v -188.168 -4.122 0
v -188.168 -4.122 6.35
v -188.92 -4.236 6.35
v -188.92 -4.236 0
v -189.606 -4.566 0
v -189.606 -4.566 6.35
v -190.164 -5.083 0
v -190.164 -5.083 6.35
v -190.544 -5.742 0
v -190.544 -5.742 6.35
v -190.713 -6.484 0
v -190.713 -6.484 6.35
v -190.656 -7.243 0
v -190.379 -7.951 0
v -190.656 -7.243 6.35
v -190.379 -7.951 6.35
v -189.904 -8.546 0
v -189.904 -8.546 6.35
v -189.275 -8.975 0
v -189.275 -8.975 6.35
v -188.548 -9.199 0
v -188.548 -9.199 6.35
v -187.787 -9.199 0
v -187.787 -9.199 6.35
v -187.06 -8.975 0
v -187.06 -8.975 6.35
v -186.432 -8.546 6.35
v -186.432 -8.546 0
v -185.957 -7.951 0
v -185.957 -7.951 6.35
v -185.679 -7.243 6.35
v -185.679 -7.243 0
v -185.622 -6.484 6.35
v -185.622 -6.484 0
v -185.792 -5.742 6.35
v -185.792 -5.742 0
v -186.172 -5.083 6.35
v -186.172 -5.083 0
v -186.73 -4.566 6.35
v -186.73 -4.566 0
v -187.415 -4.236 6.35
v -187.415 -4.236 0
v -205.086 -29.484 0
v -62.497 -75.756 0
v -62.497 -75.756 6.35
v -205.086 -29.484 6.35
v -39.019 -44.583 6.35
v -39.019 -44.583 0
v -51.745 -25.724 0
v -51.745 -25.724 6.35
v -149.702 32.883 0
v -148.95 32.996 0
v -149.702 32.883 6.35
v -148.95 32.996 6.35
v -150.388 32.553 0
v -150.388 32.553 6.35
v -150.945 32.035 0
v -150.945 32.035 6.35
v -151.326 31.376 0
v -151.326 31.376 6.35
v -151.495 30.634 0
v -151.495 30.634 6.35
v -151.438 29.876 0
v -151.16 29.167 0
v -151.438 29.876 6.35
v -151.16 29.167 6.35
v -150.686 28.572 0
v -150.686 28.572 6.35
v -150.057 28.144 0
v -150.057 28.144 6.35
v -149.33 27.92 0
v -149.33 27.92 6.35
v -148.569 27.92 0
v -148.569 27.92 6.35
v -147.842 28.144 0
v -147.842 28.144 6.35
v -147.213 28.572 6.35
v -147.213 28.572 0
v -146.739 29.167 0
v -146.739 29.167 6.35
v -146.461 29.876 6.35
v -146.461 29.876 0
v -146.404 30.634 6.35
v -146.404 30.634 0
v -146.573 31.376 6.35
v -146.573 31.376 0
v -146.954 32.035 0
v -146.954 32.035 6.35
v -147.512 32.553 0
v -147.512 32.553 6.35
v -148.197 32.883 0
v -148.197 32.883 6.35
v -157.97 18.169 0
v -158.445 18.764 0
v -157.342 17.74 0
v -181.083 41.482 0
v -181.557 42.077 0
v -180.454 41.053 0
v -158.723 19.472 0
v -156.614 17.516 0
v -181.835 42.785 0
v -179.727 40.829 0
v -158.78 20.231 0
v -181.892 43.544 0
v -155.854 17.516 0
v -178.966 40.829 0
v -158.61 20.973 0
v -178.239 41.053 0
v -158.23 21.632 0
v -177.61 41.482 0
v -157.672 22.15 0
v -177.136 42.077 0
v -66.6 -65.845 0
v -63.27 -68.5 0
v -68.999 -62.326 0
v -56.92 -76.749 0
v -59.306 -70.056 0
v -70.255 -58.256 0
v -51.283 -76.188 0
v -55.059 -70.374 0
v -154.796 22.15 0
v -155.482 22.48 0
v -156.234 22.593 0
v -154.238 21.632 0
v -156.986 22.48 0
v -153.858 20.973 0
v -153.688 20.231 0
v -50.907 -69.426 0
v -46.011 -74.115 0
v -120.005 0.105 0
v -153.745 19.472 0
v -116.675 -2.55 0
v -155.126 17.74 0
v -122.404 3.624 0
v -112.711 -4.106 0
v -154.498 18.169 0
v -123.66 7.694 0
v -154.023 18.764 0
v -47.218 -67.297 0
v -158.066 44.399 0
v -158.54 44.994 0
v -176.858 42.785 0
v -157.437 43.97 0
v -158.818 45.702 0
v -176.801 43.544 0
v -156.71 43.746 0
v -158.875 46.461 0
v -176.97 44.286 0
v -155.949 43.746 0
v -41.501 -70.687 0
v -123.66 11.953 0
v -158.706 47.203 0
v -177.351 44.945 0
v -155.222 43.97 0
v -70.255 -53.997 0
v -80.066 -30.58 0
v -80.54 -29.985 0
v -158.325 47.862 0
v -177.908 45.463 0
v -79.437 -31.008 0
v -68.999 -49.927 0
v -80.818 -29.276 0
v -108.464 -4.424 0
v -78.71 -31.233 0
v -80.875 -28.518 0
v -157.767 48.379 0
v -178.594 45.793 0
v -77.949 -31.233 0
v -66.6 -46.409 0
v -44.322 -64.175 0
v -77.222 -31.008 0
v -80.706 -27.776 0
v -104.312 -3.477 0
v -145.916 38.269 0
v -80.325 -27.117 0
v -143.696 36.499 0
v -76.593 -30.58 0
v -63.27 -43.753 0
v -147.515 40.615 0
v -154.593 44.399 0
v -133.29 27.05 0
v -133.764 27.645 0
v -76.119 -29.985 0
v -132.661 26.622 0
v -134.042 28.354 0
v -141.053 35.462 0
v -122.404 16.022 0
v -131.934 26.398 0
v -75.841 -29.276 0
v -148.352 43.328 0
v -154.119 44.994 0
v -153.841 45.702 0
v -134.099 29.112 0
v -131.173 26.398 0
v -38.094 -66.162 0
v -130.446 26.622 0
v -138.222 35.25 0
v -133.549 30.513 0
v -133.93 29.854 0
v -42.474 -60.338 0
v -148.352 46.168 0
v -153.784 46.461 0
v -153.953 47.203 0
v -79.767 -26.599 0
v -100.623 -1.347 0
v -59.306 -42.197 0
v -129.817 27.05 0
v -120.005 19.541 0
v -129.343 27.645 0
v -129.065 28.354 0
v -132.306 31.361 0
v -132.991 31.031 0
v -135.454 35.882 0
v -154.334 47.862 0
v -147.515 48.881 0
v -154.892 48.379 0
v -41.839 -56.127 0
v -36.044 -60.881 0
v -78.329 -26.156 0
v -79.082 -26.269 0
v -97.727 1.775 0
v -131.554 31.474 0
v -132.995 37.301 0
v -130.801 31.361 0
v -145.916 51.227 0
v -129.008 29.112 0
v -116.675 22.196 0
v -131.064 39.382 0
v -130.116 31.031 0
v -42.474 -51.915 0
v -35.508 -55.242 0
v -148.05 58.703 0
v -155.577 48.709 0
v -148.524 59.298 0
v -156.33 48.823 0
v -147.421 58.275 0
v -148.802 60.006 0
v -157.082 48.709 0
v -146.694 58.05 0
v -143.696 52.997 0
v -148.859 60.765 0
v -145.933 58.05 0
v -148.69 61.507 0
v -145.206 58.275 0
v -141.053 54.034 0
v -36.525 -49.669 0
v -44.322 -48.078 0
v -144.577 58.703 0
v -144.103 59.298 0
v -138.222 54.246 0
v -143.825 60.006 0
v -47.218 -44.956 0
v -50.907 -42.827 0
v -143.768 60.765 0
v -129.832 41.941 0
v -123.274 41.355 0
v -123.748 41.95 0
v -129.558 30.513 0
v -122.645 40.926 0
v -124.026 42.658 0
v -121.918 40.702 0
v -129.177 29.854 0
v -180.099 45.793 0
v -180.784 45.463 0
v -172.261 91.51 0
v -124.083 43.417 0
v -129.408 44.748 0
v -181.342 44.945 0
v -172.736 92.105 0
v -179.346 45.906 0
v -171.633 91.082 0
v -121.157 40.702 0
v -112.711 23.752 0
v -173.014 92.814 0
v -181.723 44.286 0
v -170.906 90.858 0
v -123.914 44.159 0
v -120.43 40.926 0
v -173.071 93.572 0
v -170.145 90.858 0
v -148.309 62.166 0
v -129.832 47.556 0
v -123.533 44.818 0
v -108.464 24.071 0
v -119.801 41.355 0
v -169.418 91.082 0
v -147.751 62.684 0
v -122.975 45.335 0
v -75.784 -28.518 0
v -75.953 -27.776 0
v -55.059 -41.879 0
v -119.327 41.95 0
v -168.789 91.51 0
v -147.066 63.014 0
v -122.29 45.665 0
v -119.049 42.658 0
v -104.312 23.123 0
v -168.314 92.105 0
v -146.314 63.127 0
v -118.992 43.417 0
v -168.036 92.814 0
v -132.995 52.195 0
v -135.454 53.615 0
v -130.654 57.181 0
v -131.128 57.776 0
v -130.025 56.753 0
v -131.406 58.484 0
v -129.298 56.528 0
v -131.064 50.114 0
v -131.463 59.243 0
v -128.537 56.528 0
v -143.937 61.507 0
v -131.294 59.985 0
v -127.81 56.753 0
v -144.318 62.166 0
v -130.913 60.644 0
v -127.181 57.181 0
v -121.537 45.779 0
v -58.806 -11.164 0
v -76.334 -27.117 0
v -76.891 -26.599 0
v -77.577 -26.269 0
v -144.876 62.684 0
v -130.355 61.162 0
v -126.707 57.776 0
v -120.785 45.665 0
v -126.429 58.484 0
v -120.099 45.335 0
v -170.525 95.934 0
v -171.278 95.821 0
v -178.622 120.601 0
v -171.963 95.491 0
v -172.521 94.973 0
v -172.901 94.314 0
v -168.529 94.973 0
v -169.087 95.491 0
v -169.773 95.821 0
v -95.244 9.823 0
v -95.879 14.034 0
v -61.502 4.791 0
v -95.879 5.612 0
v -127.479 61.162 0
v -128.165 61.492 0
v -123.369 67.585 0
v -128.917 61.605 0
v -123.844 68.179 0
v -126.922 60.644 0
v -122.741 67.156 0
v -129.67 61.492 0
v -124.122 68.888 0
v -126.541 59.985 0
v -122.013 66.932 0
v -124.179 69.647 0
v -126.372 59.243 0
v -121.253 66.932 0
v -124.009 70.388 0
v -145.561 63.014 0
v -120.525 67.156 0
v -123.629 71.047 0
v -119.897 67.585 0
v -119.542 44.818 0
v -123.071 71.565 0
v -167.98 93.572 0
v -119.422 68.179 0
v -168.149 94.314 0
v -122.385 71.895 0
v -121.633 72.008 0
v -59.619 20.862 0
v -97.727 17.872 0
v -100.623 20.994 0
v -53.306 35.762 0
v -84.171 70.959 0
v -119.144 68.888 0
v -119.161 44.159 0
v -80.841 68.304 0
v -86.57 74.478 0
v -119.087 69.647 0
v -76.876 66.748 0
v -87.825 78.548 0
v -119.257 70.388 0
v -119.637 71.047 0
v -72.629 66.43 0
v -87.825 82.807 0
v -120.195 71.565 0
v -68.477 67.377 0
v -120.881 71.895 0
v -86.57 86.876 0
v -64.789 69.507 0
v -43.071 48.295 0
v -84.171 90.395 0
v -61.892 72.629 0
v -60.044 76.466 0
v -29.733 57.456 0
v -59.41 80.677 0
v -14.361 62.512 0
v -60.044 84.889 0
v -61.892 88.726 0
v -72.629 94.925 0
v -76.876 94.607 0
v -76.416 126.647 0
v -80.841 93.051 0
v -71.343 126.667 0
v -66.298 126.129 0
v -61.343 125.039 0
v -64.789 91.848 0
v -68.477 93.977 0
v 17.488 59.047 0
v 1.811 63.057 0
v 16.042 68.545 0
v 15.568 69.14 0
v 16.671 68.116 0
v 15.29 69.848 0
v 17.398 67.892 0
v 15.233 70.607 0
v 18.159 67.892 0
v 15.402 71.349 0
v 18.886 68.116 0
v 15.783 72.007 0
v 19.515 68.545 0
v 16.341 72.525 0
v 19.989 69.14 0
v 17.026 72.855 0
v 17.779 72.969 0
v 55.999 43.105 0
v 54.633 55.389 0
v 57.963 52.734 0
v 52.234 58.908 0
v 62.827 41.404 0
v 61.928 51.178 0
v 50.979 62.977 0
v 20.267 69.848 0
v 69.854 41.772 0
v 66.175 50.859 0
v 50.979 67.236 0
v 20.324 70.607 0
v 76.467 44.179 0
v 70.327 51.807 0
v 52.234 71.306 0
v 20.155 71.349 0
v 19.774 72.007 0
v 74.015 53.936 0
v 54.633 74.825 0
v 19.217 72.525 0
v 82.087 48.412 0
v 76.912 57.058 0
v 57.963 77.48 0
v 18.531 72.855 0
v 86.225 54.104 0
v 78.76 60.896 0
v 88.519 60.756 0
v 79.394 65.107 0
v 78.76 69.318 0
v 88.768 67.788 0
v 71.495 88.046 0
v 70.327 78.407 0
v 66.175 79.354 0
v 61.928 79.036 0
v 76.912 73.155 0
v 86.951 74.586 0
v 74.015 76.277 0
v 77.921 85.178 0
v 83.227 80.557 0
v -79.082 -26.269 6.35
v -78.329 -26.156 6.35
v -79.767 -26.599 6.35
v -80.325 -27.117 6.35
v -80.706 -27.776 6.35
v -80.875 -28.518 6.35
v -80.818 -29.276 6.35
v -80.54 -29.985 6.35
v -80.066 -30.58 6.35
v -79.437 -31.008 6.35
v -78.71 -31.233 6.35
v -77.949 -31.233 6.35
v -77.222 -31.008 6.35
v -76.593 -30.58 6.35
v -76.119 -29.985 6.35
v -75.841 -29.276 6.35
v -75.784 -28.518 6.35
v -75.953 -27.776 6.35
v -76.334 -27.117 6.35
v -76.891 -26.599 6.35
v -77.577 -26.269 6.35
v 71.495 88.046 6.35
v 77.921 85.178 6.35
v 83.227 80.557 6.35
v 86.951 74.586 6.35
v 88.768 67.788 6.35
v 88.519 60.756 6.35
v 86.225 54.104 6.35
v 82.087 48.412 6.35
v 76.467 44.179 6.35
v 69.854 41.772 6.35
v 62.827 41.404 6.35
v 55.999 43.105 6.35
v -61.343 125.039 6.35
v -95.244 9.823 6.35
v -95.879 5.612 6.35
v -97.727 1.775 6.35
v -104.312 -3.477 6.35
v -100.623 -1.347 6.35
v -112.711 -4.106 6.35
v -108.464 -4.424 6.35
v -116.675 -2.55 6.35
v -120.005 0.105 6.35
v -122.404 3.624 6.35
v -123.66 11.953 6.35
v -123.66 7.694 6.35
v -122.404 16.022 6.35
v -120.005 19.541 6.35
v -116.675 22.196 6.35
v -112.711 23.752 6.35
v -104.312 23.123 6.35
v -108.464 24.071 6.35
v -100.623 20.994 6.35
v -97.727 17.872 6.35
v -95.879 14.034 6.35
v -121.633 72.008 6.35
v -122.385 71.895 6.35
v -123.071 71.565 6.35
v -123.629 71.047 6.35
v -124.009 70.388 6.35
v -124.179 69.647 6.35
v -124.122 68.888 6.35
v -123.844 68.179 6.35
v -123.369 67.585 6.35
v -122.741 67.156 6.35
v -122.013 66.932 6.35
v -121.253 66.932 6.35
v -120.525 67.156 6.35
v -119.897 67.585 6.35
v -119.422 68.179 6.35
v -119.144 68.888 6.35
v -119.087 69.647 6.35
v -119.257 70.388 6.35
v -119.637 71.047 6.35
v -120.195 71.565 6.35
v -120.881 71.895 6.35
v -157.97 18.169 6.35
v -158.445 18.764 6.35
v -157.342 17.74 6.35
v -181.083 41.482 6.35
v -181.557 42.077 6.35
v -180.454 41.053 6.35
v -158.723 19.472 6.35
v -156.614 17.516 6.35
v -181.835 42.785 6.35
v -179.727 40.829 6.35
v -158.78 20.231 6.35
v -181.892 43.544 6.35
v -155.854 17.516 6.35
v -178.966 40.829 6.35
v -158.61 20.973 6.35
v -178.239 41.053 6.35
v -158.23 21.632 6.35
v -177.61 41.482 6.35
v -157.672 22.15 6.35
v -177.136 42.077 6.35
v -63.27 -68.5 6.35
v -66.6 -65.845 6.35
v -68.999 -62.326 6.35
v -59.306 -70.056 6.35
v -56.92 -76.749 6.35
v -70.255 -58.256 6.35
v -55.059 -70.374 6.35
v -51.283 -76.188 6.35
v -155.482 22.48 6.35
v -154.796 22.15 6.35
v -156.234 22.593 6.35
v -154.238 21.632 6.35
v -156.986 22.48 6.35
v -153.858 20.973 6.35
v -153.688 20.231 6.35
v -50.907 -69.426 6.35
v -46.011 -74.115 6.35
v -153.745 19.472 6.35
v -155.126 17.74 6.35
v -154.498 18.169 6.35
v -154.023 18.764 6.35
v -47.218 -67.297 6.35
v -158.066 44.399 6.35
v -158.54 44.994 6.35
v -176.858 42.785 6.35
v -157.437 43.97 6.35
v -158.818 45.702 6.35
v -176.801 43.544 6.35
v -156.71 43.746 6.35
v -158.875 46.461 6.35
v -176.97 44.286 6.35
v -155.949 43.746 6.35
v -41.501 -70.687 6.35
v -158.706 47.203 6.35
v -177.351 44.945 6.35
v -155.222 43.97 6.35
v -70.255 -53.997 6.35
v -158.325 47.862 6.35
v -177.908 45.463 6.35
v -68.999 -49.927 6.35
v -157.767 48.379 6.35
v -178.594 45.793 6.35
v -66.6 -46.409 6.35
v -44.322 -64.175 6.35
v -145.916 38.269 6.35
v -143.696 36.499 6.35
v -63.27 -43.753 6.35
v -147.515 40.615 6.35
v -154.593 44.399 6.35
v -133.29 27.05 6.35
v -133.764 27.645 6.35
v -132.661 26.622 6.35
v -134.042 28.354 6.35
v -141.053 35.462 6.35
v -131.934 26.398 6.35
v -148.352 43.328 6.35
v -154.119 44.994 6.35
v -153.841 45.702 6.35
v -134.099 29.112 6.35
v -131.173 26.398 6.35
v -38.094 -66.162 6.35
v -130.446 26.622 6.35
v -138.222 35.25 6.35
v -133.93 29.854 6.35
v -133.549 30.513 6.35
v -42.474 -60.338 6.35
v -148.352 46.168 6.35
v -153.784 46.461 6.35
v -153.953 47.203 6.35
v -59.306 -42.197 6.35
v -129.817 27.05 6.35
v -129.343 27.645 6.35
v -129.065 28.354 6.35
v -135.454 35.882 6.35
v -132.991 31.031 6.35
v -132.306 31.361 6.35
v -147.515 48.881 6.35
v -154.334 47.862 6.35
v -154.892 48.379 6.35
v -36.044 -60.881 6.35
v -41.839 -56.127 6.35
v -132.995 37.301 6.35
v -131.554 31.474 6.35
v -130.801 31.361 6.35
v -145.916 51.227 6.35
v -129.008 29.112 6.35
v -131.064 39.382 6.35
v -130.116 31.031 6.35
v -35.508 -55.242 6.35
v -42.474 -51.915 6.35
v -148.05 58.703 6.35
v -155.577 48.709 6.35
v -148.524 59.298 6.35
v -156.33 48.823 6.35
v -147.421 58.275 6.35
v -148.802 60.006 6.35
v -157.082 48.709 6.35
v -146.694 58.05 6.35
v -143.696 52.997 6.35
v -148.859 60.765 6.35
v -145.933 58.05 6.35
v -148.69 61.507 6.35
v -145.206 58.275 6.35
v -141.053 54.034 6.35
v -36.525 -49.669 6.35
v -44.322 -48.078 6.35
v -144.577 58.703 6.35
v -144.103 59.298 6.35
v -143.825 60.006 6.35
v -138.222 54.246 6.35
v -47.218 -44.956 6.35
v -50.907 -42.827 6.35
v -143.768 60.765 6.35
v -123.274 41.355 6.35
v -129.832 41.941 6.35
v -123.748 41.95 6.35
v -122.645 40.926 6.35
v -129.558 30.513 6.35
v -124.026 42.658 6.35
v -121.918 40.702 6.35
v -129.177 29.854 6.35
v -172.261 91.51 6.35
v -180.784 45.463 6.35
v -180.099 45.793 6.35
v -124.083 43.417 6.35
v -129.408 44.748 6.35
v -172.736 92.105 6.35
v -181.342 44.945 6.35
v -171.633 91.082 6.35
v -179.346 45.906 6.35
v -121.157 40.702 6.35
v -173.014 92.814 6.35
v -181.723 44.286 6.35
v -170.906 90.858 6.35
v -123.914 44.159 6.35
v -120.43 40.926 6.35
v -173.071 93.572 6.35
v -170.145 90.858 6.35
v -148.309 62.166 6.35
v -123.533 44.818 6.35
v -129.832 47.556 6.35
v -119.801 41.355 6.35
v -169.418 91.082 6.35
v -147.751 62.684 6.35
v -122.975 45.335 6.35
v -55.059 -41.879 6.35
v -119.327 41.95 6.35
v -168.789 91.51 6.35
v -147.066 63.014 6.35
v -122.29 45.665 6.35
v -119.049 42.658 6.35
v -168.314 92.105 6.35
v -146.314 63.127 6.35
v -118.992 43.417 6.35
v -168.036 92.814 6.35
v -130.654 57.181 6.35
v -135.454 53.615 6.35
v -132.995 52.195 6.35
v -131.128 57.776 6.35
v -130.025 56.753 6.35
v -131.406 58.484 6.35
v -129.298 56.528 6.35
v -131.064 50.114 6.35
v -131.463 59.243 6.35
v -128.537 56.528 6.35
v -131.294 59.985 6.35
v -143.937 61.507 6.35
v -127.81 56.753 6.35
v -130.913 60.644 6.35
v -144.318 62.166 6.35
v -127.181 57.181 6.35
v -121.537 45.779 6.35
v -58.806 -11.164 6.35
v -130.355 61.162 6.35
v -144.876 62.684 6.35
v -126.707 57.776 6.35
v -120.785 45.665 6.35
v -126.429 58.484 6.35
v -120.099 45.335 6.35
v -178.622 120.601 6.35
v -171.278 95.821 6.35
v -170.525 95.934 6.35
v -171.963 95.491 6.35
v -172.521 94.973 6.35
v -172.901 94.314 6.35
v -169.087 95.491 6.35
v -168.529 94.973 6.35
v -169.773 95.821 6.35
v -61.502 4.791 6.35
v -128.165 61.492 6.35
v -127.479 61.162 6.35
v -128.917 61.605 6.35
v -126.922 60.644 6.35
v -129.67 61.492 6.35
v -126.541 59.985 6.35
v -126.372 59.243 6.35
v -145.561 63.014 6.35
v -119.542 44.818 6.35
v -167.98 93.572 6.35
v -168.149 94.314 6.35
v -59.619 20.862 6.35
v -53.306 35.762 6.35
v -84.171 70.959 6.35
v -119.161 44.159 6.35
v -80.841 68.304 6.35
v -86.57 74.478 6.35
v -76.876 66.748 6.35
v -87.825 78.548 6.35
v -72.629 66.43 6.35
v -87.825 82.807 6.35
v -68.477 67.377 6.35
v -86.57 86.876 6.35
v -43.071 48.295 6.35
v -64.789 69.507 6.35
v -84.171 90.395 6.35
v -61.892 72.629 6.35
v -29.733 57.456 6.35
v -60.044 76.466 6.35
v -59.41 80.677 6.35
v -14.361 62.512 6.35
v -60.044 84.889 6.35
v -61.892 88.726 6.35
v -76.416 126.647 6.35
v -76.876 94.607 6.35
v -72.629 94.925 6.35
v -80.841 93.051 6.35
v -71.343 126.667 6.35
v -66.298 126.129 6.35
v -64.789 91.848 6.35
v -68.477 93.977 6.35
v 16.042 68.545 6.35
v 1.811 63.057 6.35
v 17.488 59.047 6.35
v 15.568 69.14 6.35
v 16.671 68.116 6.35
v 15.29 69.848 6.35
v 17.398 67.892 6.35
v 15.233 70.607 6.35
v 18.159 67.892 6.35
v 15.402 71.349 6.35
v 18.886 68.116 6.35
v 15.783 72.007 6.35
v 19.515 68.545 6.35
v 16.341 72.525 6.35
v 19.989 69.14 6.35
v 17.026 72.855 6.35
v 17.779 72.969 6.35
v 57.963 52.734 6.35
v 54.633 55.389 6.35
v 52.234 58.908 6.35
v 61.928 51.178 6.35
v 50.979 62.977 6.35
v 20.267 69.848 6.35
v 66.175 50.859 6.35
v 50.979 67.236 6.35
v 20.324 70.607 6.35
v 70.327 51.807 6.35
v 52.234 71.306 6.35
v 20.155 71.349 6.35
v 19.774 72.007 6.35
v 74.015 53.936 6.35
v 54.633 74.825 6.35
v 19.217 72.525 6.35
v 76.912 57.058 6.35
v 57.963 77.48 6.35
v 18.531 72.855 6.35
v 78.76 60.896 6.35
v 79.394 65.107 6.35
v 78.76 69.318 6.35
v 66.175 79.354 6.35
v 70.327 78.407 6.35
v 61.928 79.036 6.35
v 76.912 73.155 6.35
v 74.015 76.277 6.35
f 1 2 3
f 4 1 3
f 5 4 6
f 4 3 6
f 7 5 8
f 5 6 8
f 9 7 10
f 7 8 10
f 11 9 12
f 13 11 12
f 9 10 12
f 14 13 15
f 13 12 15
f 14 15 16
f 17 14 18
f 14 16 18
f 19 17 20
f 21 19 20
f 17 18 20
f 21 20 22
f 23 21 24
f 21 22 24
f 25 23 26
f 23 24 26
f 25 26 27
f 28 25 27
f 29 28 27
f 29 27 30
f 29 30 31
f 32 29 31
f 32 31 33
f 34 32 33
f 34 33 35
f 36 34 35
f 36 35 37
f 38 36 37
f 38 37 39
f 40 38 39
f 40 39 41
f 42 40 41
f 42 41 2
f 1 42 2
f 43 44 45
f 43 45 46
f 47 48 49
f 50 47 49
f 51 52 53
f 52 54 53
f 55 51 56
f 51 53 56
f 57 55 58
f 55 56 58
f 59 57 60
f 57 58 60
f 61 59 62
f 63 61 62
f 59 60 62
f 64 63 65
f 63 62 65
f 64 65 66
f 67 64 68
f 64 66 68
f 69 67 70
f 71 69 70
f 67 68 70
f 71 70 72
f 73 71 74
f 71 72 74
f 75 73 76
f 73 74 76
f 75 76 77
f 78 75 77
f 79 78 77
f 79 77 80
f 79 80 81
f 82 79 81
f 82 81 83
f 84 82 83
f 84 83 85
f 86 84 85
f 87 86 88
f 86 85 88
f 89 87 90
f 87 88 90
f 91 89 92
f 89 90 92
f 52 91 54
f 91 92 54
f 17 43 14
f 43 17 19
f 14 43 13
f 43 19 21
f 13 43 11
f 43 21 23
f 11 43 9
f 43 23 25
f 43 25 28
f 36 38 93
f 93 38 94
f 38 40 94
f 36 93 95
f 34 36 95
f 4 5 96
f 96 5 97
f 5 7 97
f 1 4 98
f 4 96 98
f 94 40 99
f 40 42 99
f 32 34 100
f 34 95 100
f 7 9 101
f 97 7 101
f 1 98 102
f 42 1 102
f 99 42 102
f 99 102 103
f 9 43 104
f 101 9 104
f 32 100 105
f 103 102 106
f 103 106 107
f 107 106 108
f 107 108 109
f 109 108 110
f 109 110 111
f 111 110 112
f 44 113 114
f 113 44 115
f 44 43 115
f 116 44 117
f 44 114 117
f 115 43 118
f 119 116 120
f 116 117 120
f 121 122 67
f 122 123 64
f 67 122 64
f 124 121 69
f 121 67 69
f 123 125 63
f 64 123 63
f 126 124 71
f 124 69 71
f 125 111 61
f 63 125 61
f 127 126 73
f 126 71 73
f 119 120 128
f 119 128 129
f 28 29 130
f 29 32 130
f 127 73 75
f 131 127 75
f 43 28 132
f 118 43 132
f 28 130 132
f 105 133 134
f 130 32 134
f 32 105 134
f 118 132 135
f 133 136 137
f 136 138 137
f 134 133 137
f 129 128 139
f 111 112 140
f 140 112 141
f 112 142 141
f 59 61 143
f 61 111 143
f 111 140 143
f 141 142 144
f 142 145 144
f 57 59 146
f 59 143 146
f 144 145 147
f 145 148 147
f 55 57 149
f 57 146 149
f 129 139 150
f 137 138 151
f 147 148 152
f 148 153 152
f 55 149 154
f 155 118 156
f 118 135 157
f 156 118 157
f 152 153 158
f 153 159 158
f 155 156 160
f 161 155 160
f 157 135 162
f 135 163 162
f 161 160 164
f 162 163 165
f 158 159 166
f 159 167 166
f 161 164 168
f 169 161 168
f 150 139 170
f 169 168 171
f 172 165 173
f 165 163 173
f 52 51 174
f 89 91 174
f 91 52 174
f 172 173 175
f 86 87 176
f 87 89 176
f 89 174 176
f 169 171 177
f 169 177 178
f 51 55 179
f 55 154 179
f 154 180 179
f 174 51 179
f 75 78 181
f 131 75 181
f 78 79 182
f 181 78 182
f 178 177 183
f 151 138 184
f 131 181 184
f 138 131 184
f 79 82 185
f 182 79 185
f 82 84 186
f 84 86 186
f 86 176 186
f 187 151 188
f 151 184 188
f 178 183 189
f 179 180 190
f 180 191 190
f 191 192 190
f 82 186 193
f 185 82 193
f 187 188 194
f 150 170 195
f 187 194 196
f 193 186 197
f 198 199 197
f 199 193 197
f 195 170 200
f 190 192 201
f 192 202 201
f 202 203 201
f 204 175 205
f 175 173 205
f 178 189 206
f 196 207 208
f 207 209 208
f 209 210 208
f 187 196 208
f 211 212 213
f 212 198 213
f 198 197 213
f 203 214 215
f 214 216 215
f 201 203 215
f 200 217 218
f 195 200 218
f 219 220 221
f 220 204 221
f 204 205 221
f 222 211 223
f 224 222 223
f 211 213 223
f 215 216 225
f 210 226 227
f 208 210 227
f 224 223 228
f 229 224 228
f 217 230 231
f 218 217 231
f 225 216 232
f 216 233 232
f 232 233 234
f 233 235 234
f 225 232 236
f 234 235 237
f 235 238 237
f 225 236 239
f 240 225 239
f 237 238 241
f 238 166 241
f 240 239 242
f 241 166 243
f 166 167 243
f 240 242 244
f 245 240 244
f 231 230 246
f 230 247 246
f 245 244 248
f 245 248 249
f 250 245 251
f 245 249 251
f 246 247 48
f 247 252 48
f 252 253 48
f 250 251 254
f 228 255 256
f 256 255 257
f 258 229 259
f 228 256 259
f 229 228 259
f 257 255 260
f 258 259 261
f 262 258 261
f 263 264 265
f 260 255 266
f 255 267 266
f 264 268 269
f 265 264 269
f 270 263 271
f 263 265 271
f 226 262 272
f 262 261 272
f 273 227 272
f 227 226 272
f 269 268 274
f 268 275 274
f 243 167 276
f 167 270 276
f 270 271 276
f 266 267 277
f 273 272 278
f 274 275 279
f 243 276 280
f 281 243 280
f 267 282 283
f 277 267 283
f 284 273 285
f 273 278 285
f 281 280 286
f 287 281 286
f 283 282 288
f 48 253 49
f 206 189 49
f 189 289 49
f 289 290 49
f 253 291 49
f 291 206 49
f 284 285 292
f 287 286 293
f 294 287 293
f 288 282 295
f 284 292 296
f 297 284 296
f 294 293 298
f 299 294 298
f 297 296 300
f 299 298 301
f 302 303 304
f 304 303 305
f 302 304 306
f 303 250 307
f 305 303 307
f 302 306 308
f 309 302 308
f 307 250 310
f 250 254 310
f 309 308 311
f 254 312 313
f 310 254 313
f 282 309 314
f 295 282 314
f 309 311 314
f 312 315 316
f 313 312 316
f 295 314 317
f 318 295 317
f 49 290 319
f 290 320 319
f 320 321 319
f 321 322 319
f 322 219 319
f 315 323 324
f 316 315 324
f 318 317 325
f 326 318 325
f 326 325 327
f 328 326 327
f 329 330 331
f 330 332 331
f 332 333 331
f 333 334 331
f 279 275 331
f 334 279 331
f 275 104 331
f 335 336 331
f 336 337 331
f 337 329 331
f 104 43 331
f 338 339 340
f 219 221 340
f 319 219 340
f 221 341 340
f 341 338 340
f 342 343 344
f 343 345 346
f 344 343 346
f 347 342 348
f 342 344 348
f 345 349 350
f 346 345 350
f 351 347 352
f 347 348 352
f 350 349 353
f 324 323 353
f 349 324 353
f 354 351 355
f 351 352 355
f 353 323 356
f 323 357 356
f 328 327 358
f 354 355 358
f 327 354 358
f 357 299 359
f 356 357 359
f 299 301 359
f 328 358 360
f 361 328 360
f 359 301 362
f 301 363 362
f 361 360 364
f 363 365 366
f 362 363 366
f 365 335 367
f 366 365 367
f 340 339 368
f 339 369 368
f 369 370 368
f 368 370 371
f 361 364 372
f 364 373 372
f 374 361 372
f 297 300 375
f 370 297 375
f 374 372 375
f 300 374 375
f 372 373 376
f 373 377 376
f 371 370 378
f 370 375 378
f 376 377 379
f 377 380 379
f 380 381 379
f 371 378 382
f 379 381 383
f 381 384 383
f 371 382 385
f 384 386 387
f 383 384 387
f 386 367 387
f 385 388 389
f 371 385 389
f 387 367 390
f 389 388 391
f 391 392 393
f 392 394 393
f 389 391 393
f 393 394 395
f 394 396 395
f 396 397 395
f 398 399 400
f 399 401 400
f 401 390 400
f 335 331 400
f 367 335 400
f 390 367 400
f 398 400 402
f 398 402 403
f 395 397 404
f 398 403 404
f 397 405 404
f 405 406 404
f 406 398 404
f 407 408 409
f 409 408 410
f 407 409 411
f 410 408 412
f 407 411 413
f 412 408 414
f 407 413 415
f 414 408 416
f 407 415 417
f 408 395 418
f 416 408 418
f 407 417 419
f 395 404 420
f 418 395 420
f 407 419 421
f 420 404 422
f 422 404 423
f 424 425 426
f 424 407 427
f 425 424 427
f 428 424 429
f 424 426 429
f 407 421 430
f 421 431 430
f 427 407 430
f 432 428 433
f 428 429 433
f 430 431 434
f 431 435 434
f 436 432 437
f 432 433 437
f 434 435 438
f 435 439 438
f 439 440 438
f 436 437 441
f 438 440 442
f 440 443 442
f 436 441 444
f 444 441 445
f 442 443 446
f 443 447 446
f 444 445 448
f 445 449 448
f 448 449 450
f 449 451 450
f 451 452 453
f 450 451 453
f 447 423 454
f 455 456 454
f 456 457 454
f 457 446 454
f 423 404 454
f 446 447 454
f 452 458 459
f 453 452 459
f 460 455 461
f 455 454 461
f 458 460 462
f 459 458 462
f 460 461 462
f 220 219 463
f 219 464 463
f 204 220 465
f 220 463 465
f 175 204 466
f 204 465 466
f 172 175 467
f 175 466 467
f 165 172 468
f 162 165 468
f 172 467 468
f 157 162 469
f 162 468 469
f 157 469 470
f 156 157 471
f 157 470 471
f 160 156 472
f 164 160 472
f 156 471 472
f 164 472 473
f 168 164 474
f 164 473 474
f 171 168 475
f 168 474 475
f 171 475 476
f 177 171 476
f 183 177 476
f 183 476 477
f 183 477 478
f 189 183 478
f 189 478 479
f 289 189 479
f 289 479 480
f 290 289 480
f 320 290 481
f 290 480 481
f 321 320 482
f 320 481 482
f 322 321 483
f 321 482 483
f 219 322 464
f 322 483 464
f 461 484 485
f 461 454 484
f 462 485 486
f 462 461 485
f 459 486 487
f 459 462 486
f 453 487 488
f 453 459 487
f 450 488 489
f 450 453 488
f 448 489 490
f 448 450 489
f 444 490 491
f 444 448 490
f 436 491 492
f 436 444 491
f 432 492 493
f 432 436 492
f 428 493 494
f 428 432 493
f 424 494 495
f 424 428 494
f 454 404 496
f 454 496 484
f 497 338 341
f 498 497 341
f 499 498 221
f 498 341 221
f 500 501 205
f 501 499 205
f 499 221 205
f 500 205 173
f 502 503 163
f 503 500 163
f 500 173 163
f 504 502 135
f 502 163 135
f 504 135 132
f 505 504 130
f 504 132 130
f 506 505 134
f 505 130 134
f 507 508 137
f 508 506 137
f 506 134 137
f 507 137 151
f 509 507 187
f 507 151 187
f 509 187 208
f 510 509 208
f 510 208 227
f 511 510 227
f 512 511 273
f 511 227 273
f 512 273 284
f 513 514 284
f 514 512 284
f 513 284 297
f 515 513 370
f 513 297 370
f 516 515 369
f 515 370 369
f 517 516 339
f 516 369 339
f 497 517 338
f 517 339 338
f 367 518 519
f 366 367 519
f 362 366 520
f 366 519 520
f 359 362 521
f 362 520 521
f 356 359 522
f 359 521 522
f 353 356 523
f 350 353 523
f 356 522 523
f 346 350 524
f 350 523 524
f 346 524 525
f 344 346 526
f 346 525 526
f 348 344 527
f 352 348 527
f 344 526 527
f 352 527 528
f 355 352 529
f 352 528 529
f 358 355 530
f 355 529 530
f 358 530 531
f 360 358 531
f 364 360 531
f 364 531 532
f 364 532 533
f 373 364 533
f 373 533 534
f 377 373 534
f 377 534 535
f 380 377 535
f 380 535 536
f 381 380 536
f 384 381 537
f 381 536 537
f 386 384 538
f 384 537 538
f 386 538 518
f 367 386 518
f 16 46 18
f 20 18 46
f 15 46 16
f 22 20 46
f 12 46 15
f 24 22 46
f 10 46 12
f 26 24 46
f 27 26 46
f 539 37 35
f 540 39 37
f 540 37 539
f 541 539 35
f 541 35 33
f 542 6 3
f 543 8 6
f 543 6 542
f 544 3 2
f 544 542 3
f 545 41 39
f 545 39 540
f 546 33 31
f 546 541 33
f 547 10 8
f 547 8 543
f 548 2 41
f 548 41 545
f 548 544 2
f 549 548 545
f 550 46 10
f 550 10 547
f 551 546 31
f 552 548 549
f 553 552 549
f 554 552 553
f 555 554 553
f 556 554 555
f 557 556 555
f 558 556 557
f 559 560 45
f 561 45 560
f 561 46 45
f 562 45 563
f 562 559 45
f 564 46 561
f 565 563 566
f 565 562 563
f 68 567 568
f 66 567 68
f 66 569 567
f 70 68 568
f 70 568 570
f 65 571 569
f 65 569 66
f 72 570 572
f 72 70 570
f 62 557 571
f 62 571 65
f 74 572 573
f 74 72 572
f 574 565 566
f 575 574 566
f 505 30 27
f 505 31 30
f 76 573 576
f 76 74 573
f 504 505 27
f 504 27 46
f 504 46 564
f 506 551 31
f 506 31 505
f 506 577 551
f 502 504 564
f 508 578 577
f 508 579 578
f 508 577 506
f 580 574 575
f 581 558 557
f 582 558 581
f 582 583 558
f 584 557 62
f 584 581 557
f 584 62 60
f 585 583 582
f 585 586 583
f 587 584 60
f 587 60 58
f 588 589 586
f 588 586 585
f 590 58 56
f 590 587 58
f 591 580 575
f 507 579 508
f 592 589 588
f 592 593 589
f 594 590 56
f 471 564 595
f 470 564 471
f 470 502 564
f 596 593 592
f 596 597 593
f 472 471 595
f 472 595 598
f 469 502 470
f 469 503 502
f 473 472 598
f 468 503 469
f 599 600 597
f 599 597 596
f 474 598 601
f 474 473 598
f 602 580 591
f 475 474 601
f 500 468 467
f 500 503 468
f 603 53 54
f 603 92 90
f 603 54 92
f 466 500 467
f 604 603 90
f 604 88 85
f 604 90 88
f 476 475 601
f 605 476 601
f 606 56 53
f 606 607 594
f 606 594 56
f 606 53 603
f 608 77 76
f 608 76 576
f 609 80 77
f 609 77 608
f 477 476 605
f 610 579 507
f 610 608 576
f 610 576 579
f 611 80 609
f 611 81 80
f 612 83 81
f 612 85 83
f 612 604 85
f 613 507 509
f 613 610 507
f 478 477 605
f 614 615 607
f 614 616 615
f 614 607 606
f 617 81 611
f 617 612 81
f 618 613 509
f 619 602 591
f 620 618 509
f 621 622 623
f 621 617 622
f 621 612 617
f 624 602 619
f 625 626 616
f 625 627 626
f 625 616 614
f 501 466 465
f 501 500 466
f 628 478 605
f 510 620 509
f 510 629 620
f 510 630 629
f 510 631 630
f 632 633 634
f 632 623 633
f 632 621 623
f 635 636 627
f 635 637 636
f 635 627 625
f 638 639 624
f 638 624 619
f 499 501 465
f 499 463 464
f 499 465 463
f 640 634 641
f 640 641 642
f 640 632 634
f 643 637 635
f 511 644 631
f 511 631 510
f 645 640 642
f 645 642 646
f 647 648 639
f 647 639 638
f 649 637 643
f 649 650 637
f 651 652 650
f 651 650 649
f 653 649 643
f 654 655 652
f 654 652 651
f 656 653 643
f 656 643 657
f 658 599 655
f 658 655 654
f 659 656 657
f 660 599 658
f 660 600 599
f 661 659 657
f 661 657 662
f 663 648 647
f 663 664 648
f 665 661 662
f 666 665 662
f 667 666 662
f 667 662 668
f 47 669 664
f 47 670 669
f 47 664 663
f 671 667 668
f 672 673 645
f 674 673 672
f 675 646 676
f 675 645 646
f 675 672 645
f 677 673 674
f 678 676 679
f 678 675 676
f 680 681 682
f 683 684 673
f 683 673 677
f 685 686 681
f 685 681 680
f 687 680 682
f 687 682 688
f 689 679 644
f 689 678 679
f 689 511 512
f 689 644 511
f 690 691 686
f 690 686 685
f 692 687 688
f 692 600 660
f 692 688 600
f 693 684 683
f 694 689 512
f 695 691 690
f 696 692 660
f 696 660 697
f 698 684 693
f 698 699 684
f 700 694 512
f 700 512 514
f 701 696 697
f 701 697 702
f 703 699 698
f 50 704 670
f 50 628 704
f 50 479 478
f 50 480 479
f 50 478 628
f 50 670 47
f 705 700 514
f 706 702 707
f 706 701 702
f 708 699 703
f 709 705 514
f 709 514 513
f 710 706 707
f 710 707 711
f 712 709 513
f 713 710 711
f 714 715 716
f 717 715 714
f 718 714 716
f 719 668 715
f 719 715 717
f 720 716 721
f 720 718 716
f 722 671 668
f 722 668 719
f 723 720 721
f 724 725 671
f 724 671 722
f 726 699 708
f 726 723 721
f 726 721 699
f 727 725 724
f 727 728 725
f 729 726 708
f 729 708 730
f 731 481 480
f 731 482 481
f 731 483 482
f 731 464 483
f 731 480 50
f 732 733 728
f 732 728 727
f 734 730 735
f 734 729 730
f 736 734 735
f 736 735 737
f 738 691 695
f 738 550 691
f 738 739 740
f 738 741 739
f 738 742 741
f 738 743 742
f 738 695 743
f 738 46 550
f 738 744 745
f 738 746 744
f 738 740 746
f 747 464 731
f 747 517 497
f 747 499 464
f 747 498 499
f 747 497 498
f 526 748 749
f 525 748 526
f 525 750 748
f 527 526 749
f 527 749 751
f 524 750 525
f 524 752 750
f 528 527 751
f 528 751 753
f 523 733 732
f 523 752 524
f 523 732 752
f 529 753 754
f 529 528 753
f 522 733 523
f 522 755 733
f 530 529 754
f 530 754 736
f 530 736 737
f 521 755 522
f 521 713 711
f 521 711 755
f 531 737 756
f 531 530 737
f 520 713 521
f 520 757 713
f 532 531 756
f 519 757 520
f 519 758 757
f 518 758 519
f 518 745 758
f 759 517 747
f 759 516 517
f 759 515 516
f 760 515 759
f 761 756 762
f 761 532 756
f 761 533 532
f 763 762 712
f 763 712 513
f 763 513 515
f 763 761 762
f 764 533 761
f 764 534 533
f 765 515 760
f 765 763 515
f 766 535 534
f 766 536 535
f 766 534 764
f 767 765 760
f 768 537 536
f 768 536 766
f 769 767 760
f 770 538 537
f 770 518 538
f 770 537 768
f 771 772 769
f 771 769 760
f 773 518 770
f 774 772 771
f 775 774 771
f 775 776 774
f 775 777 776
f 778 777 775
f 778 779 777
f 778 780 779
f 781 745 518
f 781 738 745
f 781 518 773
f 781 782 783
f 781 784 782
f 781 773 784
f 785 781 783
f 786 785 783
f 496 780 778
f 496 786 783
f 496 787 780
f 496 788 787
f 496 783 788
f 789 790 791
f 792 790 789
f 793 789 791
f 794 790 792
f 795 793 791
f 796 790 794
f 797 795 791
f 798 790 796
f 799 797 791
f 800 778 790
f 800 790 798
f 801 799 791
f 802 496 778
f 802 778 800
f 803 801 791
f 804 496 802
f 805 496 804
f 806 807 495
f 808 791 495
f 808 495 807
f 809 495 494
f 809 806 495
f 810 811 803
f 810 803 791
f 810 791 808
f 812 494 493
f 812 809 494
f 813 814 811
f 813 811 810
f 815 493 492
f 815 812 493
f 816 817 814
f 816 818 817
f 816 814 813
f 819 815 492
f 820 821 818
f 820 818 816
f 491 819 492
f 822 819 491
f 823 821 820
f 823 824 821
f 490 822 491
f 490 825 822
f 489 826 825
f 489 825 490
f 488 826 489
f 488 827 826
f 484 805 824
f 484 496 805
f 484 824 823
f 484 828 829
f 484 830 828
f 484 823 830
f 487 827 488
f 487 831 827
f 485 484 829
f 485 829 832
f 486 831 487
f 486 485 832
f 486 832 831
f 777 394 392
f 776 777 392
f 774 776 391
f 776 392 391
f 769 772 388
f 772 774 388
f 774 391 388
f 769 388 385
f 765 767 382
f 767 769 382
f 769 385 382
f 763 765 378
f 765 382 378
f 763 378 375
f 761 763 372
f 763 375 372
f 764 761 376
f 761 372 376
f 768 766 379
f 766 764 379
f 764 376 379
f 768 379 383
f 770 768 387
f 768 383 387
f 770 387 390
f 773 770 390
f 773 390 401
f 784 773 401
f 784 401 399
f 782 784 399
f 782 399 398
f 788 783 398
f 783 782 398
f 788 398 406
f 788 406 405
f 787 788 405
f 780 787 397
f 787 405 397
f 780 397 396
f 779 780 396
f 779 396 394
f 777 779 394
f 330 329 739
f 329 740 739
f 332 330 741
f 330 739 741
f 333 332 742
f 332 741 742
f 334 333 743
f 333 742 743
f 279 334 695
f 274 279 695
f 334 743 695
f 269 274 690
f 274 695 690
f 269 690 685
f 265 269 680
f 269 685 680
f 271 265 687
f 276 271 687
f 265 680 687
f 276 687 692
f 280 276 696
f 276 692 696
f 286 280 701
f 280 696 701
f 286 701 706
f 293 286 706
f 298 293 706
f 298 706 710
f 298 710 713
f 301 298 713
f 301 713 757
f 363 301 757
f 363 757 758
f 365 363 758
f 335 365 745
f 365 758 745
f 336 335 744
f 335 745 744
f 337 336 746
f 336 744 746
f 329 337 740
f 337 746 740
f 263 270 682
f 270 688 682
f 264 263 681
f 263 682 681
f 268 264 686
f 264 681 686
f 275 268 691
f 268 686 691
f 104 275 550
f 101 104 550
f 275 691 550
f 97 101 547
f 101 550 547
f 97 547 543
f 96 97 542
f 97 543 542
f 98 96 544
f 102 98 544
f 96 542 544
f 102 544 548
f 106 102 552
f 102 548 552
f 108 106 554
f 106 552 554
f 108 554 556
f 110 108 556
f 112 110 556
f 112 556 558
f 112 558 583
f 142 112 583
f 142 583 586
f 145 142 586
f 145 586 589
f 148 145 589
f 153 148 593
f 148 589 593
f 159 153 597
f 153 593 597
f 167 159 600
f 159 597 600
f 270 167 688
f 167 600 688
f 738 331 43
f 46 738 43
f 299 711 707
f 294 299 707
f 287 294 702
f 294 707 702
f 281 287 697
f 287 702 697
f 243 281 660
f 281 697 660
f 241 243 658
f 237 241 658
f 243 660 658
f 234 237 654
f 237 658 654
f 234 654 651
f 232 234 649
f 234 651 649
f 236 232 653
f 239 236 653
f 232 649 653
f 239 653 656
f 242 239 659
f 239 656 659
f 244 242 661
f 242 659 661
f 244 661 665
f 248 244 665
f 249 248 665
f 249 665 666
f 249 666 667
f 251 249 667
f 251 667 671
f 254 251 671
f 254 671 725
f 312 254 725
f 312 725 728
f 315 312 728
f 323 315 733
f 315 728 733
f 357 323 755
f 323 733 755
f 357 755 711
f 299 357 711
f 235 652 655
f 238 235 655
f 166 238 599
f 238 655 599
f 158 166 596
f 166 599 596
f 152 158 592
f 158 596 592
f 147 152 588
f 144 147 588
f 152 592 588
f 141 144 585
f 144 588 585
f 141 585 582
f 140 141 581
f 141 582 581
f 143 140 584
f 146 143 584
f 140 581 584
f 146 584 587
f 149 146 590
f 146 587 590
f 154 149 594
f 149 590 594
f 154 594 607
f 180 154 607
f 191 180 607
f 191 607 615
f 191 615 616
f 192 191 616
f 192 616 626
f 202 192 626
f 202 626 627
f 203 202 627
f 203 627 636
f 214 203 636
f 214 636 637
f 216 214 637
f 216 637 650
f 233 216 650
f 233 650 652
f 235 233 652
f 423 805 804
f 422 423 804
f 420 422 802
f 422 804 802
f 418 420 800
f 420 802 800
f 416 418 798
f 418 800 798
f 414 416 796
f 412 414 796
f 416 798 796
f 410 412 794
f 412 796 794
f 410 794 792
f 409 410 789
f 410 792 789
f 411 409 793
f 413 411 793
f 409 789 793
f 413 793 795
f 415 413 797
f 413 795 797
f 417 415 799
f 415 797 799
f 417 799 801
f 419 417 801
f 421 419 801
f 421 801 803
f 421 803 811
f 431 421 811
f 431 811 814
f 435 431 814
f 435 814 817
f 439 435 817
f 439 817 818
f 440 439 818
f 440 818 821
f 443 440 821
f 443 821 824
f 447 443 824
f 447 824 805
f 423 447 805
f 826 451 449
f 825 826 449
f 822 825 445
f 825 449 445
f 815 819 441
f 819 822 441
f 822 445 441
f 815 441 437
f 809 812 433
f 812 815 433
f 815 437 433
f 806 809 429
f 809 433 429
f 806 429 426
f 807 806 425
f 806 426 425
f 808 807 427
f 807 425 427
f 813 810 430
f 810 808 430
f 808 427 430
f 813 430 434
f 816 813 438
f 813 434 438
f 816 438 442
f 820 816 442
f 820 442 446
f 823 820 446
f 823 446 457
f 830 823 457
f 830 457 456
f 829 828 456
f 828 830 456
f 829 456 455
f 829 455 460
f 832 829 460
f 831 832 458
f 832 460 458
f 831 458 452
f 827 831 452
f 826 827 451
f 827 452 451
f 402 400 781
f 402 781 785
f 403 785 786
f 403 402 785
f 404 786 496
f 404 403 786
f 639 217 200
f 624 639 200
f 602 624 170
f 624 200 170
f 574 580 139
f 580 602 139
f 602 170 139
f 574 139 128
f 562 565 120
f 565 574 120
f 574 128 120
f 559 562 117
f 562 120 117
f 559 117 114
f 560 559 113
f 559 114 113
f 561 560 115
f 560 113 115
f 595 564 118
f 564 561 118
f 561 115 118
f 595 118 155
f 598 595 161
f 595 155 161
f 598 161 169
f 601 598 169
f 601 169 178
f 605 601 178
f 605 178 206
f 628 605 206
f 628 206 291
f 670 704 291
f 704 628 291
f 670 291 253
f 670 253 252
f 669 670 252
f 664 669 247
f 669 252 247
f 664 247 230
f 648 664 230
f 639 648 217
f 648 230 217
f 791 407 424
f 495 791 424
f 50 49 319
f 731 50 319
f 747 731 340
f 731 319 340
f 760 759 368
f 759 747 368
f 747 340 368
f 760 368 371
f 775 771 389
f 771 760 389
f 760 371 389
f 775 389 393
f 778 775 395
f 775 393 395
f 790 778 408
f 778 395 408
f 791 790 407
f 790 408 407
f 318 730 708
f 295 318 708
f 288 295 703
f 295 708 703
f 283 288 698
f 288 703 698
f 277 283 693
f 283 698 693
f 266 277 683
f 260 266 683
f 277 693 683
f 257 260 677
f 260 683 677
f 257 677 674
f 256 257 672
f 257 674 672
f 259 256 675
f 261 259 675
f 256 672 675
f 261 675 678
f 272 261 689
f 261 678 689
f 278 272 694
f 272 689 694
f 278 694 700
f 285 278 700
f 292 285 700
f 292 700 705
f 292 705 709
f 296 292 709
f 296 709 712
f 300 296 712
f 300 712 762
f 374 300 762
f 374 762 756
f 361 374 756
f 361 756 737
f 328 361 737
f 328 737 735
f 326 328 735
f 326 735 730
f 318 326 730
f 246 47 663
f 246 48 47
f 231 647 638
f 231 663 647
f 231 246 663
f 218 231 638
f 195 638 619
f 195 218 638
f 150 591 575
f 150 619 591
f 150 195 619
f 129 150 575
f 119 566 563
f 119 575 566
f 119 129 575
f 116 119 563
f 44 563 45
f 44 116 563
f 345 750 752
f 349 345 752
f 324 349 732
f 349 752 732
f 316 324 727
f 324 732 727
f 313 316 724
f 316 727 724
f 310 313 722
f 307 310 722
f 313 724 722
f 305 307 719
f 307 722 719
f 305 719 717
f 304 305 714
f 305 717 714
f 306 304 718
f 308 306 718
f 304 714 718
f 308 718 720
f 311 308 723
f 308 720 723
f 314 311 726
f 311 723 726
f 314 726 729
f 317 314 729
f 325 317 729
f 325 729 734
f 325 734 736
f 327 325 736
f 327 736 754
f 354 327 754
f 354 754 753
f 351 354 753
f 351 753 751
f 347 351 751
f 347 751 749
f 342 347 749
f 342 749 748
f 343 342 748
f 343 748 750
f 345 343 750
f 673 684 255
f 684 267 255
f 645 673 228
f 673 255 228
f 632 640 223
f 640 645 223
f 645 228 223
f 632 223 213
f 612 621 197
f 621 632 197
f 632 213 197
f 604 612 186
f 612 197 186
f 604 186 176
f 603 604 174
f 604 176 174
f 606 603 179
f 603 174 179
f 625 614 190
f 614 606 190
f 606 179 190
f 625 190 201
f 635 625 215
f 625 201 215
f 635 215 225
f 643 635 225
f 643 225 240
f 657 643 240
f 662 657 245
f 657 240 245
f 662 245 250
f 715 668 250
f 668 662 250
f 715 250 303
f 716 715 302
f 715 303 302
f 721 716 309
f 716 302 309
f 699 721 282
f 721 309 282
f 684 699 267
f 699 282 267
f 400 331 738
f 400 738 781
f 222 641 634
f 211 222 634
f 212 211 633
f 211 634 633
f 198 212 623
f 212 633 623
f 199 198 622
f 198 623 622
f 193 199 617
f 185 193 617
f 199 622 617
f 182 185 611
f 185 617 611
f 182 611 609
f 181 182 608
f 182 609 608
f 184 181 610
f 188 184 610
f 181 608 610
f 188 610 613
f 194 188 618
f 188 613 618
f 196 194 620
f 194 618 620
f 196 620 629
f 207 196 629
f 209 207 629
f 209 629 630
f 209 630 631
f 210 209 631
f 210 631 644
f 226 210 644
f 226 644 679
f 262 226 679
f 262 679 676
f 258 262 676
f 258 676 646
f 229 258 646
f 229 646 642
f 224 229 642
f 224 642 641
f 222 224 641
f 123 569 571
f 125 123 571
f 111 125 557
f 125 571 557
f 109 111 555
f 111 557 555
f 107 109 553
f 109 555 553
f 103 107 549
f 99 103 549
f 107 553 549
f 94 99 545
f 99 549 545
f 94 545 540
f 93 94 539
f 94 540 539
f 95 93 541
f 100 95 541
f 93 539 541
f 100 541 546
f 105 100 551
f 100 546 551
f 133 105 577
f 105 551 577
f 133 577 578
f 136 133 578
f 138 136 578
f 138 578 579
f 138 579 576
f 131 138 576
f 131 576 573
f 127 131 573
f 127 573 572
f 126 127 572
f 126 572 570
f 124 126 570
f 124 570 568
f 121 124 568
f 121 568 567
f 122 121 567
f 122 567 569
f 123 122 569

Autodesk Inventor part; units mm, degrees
ref_plane "YZ Plane" through (0, 0, 0) normal (1, 0, 0) x (0, 1, 0)
ref_plane "XZ Plane" through (0, 0, 0) normal (0, 1, 0) x (-1, 0, 0)
ref_plane "XY Plane" through (0, 0, 0) normal (0, 0, 1) x (1, 0, 0)
sketch "Sketch1" plane through (0, 0, 0) normal (0, 0, 1) x (1, 0, 0)
  circle A0 centre (65.1069, 65.1069) radius 38.1 construction
  circle A1 centre (-56.1266, -56.1266) radius 25.4 construction
  circle A2 centre (0, 0) radius 53.975 construction
  line L0 (-38.1661, -38.1661) -> (38.1661, 38.1661) construction
  line L1 (65.1069, 65.1069) -> (-56.1266, -56.1266) construction
  line L2 (-4.3707, 6.2419) -> (-4.3707, 53.7978) construction
  line L3 (-211.1644, -81.5266) -> (654.2277, -81.5266) construction
  circle A3 centre (163.556, -24.3766) radius 57.15 construction
  circle A4 centre (65.1069, 65.1069) radius 14.2875
  circle A5 centre (-56.1266, -56.1266) radius 14.2875
  circle A6 centre (-4.3707, 6.2419) radius 57.15 construction
  circle A7 centre (-56.1266, -56.1266) radius 20.6375 construction
  circle A8 centre (65.1069, 65.1069) radius 23.8125 construction
  circle A9 centre (-73.6972, 80.6773) radius 14.2875
  line L4 (-73.6972, 80.6773) -> (65.1069, 65.1069) construction
  circle A10 centre (65.1069, 65.1069) radius 14.3256 construction
  circle A11 centre (-56.1266, -56.1266) radius 14.3256 construction
  circle A12 centre (-109.5316, 9.8231) radius 14.2875
  line L5 (-56.1266, -56.1266) -> (-109.5316, 9.8231) construction
  circle A13 centre (-109.5316, 9.8231) radius 39.7002 construction
  circle A14 centre (-73.6972, 80.6773) radius 39.7002 construction
  line L6 (17.4877, 59.0466) -> (55.9992, 43.1049)
  line L7 (-39.0193, -44.5834) -> (-51.7448, -25.7239)
  arc A15 (17.4877, 59.0466) -> (-51.7448, -25.7239) centre (-4.3707, 6.2419) ccw
  line L8 (-178.6215, 120.6011) -> (-153.6074, 116.1905) construction
  line L9 (-153.6074, 116.1905) -> (-180.0714, -33.8943) construction
  line L10 (-180.0714, -33.8943) -> (-205.0855, -29.4836) construction
  line L11 (-205.0855, -29.4836) -> (-178.6215, 120.6011) construction
  line L12 (-209.5607, -54.8639) -> (55.1963, -101.5477) construction
  line L13 (-174.1463, 145.9814) -> (158.0246, 87.4107) construction
  line L14 (-174.1463, 145.9814) -> (-209.5607, -54.8639) construction
  circle A16 centre (-138.9335, 44.7481) radius 25.4 construction
  circle A17 centre (-138.9335, 44.7481) radius 5.9531 construction
  line L15 (-84.5475, -21.0298) -> (-72.1113, -36.3871) construction
  circle A18 centre (17.7787, 70.4159) radius 9.525 construction
  line L16 (-166.1144, 118.3958) -> (-192.5784, -31.6889) construction
  line L17 (-170.5251, 93.3817) -> (-188.1678, -6.6748) construction
  circle A19 centre (-138.9335, 44.7481) radius 17.4625 construction
  circle A20 centre (-138.9335, 44.7481) radius 9.525
  circle A21 centre (-73.6972, 80.6773) radius 46.0502 construction
  line L18 (-178.6215, 120.6011) -> (-76.4165, 126.6471)
  line L19 (-61.3431, 125.0394) -> (71.4951, 88.0465)
  line L20 (-62.4968, -75.7563) -> (-205.0855, -29.4836)
  line L21 (-178.6215, 120.6011) -> (-205.0855, -29.4836)
  arc A22 (-61.3431, 125.0394) -> (-76.4165, 126.6471) centre (-73.6972, 80.6773) ccw
  arc A23 (55.9992, 43.1049) -> (71.4951, 88.0465) centre (65.1069, 65.1069) ccw
  arc A24 (-62.4968, -75.7563) -> (-39.0193, -44.5834) centre (-56.1266, -56.1266) ccw
  line L22 (-138.9335, 44.7481) -> (-128.9174, 59.0525) construction
  line L23 (-121.633, 69.4558) -> (-156.234, 20.0404) construction
  circle A25 centre (-156.234, 20.0404) radius 4.7625 construction
  line L24 (0, 0) -> (-4.3707, 6.2419) construction
  point P0 (-191.8535, 45.5588)
  point P1 (-78.3294, -28.7084)
  point P2 (-179.3464, 43.3534)
  point P3 (-179.3464, 43.3534)
  point P4 (-146.3135, 60.5745)
  point P5 (-156.3295, 46.2701)
  point P6 (-148.9496, 30.4437)
  point P7 (-131.5535, 28.9217)
  point P8 (-121.5374, 43.2261)
  point P9 (-63.3695, 121.1474)
  dimension "d7" = 50.8
  dimension "d18" = 79.4004
  dimension "d34" = 34.925
  dimension "d3" = 45
  dimension "d4" = 0
  dimension "d8" = 107.95
  dimension "d9" = 28.575
  dimension "d10" = 76.2
  dimension "d11" = 114.3
  dimension "d12" = 114.3
  dimension "d13" = 6.35
  dimension "d14" = 9.525
  dimension "d15" = 139.6746
  dimension "d16" = 28.6512
  dimension "d17" = 84.8614
  dimension "d19" = 79.4004
  dimension "d22" = 25.4
  dimension "d23" = 152.4
  dimension "d26" = 203.9436
  dimension "d27" = 50.8
  dimension "d28" = 11.9062
  dimension "d29" = 51
  dimension "d30" = 171.45
  dimension "d31" = 10
  dimension "d32" = 19.05
  dimension "d33" = 101.6
  dimension "d35" = 19.05
  dimension "d36" = 6.35
  dimension "d37" = 34.925
  dimension "d40" = 360
  dimension "d43" = 25
  dimension "d44" = 9.525
  dimension "d55" = 80
  dimension "d56" = 7.62
extrude "Extrusion1" add sketch "Sketch1" along normal blind 6.35
hole "Hole1" at (-78.3294, -28.7084, 0) at (17.7787, 70.4159, 0) at (-170.5251, 93.3817, 0) at (-179.3464, 43.3534, 0) at (-188.1678, -6.6748, 0) at (-128.9174, 59.0525, 0) at (-146.3135, 60.5745, 0) at (-156.3295, 46.2701, 0) at (-148.9496, 30.4437, 0) at (-131.5535, 28.9217, 0) at (-121.5374, 43.2261, 0) at (-121.633, 69.4558, 0) at (-156.234, 20.0404, 0) direction (0, 0, 1) diameter 5.1054 end through all clearance for "Flat Head Machine Screw (82)" size "#10" standard "Ansi Unified Screw Threads"
properties part number "GP7-001" material "Polycarbonate, Smoke"
